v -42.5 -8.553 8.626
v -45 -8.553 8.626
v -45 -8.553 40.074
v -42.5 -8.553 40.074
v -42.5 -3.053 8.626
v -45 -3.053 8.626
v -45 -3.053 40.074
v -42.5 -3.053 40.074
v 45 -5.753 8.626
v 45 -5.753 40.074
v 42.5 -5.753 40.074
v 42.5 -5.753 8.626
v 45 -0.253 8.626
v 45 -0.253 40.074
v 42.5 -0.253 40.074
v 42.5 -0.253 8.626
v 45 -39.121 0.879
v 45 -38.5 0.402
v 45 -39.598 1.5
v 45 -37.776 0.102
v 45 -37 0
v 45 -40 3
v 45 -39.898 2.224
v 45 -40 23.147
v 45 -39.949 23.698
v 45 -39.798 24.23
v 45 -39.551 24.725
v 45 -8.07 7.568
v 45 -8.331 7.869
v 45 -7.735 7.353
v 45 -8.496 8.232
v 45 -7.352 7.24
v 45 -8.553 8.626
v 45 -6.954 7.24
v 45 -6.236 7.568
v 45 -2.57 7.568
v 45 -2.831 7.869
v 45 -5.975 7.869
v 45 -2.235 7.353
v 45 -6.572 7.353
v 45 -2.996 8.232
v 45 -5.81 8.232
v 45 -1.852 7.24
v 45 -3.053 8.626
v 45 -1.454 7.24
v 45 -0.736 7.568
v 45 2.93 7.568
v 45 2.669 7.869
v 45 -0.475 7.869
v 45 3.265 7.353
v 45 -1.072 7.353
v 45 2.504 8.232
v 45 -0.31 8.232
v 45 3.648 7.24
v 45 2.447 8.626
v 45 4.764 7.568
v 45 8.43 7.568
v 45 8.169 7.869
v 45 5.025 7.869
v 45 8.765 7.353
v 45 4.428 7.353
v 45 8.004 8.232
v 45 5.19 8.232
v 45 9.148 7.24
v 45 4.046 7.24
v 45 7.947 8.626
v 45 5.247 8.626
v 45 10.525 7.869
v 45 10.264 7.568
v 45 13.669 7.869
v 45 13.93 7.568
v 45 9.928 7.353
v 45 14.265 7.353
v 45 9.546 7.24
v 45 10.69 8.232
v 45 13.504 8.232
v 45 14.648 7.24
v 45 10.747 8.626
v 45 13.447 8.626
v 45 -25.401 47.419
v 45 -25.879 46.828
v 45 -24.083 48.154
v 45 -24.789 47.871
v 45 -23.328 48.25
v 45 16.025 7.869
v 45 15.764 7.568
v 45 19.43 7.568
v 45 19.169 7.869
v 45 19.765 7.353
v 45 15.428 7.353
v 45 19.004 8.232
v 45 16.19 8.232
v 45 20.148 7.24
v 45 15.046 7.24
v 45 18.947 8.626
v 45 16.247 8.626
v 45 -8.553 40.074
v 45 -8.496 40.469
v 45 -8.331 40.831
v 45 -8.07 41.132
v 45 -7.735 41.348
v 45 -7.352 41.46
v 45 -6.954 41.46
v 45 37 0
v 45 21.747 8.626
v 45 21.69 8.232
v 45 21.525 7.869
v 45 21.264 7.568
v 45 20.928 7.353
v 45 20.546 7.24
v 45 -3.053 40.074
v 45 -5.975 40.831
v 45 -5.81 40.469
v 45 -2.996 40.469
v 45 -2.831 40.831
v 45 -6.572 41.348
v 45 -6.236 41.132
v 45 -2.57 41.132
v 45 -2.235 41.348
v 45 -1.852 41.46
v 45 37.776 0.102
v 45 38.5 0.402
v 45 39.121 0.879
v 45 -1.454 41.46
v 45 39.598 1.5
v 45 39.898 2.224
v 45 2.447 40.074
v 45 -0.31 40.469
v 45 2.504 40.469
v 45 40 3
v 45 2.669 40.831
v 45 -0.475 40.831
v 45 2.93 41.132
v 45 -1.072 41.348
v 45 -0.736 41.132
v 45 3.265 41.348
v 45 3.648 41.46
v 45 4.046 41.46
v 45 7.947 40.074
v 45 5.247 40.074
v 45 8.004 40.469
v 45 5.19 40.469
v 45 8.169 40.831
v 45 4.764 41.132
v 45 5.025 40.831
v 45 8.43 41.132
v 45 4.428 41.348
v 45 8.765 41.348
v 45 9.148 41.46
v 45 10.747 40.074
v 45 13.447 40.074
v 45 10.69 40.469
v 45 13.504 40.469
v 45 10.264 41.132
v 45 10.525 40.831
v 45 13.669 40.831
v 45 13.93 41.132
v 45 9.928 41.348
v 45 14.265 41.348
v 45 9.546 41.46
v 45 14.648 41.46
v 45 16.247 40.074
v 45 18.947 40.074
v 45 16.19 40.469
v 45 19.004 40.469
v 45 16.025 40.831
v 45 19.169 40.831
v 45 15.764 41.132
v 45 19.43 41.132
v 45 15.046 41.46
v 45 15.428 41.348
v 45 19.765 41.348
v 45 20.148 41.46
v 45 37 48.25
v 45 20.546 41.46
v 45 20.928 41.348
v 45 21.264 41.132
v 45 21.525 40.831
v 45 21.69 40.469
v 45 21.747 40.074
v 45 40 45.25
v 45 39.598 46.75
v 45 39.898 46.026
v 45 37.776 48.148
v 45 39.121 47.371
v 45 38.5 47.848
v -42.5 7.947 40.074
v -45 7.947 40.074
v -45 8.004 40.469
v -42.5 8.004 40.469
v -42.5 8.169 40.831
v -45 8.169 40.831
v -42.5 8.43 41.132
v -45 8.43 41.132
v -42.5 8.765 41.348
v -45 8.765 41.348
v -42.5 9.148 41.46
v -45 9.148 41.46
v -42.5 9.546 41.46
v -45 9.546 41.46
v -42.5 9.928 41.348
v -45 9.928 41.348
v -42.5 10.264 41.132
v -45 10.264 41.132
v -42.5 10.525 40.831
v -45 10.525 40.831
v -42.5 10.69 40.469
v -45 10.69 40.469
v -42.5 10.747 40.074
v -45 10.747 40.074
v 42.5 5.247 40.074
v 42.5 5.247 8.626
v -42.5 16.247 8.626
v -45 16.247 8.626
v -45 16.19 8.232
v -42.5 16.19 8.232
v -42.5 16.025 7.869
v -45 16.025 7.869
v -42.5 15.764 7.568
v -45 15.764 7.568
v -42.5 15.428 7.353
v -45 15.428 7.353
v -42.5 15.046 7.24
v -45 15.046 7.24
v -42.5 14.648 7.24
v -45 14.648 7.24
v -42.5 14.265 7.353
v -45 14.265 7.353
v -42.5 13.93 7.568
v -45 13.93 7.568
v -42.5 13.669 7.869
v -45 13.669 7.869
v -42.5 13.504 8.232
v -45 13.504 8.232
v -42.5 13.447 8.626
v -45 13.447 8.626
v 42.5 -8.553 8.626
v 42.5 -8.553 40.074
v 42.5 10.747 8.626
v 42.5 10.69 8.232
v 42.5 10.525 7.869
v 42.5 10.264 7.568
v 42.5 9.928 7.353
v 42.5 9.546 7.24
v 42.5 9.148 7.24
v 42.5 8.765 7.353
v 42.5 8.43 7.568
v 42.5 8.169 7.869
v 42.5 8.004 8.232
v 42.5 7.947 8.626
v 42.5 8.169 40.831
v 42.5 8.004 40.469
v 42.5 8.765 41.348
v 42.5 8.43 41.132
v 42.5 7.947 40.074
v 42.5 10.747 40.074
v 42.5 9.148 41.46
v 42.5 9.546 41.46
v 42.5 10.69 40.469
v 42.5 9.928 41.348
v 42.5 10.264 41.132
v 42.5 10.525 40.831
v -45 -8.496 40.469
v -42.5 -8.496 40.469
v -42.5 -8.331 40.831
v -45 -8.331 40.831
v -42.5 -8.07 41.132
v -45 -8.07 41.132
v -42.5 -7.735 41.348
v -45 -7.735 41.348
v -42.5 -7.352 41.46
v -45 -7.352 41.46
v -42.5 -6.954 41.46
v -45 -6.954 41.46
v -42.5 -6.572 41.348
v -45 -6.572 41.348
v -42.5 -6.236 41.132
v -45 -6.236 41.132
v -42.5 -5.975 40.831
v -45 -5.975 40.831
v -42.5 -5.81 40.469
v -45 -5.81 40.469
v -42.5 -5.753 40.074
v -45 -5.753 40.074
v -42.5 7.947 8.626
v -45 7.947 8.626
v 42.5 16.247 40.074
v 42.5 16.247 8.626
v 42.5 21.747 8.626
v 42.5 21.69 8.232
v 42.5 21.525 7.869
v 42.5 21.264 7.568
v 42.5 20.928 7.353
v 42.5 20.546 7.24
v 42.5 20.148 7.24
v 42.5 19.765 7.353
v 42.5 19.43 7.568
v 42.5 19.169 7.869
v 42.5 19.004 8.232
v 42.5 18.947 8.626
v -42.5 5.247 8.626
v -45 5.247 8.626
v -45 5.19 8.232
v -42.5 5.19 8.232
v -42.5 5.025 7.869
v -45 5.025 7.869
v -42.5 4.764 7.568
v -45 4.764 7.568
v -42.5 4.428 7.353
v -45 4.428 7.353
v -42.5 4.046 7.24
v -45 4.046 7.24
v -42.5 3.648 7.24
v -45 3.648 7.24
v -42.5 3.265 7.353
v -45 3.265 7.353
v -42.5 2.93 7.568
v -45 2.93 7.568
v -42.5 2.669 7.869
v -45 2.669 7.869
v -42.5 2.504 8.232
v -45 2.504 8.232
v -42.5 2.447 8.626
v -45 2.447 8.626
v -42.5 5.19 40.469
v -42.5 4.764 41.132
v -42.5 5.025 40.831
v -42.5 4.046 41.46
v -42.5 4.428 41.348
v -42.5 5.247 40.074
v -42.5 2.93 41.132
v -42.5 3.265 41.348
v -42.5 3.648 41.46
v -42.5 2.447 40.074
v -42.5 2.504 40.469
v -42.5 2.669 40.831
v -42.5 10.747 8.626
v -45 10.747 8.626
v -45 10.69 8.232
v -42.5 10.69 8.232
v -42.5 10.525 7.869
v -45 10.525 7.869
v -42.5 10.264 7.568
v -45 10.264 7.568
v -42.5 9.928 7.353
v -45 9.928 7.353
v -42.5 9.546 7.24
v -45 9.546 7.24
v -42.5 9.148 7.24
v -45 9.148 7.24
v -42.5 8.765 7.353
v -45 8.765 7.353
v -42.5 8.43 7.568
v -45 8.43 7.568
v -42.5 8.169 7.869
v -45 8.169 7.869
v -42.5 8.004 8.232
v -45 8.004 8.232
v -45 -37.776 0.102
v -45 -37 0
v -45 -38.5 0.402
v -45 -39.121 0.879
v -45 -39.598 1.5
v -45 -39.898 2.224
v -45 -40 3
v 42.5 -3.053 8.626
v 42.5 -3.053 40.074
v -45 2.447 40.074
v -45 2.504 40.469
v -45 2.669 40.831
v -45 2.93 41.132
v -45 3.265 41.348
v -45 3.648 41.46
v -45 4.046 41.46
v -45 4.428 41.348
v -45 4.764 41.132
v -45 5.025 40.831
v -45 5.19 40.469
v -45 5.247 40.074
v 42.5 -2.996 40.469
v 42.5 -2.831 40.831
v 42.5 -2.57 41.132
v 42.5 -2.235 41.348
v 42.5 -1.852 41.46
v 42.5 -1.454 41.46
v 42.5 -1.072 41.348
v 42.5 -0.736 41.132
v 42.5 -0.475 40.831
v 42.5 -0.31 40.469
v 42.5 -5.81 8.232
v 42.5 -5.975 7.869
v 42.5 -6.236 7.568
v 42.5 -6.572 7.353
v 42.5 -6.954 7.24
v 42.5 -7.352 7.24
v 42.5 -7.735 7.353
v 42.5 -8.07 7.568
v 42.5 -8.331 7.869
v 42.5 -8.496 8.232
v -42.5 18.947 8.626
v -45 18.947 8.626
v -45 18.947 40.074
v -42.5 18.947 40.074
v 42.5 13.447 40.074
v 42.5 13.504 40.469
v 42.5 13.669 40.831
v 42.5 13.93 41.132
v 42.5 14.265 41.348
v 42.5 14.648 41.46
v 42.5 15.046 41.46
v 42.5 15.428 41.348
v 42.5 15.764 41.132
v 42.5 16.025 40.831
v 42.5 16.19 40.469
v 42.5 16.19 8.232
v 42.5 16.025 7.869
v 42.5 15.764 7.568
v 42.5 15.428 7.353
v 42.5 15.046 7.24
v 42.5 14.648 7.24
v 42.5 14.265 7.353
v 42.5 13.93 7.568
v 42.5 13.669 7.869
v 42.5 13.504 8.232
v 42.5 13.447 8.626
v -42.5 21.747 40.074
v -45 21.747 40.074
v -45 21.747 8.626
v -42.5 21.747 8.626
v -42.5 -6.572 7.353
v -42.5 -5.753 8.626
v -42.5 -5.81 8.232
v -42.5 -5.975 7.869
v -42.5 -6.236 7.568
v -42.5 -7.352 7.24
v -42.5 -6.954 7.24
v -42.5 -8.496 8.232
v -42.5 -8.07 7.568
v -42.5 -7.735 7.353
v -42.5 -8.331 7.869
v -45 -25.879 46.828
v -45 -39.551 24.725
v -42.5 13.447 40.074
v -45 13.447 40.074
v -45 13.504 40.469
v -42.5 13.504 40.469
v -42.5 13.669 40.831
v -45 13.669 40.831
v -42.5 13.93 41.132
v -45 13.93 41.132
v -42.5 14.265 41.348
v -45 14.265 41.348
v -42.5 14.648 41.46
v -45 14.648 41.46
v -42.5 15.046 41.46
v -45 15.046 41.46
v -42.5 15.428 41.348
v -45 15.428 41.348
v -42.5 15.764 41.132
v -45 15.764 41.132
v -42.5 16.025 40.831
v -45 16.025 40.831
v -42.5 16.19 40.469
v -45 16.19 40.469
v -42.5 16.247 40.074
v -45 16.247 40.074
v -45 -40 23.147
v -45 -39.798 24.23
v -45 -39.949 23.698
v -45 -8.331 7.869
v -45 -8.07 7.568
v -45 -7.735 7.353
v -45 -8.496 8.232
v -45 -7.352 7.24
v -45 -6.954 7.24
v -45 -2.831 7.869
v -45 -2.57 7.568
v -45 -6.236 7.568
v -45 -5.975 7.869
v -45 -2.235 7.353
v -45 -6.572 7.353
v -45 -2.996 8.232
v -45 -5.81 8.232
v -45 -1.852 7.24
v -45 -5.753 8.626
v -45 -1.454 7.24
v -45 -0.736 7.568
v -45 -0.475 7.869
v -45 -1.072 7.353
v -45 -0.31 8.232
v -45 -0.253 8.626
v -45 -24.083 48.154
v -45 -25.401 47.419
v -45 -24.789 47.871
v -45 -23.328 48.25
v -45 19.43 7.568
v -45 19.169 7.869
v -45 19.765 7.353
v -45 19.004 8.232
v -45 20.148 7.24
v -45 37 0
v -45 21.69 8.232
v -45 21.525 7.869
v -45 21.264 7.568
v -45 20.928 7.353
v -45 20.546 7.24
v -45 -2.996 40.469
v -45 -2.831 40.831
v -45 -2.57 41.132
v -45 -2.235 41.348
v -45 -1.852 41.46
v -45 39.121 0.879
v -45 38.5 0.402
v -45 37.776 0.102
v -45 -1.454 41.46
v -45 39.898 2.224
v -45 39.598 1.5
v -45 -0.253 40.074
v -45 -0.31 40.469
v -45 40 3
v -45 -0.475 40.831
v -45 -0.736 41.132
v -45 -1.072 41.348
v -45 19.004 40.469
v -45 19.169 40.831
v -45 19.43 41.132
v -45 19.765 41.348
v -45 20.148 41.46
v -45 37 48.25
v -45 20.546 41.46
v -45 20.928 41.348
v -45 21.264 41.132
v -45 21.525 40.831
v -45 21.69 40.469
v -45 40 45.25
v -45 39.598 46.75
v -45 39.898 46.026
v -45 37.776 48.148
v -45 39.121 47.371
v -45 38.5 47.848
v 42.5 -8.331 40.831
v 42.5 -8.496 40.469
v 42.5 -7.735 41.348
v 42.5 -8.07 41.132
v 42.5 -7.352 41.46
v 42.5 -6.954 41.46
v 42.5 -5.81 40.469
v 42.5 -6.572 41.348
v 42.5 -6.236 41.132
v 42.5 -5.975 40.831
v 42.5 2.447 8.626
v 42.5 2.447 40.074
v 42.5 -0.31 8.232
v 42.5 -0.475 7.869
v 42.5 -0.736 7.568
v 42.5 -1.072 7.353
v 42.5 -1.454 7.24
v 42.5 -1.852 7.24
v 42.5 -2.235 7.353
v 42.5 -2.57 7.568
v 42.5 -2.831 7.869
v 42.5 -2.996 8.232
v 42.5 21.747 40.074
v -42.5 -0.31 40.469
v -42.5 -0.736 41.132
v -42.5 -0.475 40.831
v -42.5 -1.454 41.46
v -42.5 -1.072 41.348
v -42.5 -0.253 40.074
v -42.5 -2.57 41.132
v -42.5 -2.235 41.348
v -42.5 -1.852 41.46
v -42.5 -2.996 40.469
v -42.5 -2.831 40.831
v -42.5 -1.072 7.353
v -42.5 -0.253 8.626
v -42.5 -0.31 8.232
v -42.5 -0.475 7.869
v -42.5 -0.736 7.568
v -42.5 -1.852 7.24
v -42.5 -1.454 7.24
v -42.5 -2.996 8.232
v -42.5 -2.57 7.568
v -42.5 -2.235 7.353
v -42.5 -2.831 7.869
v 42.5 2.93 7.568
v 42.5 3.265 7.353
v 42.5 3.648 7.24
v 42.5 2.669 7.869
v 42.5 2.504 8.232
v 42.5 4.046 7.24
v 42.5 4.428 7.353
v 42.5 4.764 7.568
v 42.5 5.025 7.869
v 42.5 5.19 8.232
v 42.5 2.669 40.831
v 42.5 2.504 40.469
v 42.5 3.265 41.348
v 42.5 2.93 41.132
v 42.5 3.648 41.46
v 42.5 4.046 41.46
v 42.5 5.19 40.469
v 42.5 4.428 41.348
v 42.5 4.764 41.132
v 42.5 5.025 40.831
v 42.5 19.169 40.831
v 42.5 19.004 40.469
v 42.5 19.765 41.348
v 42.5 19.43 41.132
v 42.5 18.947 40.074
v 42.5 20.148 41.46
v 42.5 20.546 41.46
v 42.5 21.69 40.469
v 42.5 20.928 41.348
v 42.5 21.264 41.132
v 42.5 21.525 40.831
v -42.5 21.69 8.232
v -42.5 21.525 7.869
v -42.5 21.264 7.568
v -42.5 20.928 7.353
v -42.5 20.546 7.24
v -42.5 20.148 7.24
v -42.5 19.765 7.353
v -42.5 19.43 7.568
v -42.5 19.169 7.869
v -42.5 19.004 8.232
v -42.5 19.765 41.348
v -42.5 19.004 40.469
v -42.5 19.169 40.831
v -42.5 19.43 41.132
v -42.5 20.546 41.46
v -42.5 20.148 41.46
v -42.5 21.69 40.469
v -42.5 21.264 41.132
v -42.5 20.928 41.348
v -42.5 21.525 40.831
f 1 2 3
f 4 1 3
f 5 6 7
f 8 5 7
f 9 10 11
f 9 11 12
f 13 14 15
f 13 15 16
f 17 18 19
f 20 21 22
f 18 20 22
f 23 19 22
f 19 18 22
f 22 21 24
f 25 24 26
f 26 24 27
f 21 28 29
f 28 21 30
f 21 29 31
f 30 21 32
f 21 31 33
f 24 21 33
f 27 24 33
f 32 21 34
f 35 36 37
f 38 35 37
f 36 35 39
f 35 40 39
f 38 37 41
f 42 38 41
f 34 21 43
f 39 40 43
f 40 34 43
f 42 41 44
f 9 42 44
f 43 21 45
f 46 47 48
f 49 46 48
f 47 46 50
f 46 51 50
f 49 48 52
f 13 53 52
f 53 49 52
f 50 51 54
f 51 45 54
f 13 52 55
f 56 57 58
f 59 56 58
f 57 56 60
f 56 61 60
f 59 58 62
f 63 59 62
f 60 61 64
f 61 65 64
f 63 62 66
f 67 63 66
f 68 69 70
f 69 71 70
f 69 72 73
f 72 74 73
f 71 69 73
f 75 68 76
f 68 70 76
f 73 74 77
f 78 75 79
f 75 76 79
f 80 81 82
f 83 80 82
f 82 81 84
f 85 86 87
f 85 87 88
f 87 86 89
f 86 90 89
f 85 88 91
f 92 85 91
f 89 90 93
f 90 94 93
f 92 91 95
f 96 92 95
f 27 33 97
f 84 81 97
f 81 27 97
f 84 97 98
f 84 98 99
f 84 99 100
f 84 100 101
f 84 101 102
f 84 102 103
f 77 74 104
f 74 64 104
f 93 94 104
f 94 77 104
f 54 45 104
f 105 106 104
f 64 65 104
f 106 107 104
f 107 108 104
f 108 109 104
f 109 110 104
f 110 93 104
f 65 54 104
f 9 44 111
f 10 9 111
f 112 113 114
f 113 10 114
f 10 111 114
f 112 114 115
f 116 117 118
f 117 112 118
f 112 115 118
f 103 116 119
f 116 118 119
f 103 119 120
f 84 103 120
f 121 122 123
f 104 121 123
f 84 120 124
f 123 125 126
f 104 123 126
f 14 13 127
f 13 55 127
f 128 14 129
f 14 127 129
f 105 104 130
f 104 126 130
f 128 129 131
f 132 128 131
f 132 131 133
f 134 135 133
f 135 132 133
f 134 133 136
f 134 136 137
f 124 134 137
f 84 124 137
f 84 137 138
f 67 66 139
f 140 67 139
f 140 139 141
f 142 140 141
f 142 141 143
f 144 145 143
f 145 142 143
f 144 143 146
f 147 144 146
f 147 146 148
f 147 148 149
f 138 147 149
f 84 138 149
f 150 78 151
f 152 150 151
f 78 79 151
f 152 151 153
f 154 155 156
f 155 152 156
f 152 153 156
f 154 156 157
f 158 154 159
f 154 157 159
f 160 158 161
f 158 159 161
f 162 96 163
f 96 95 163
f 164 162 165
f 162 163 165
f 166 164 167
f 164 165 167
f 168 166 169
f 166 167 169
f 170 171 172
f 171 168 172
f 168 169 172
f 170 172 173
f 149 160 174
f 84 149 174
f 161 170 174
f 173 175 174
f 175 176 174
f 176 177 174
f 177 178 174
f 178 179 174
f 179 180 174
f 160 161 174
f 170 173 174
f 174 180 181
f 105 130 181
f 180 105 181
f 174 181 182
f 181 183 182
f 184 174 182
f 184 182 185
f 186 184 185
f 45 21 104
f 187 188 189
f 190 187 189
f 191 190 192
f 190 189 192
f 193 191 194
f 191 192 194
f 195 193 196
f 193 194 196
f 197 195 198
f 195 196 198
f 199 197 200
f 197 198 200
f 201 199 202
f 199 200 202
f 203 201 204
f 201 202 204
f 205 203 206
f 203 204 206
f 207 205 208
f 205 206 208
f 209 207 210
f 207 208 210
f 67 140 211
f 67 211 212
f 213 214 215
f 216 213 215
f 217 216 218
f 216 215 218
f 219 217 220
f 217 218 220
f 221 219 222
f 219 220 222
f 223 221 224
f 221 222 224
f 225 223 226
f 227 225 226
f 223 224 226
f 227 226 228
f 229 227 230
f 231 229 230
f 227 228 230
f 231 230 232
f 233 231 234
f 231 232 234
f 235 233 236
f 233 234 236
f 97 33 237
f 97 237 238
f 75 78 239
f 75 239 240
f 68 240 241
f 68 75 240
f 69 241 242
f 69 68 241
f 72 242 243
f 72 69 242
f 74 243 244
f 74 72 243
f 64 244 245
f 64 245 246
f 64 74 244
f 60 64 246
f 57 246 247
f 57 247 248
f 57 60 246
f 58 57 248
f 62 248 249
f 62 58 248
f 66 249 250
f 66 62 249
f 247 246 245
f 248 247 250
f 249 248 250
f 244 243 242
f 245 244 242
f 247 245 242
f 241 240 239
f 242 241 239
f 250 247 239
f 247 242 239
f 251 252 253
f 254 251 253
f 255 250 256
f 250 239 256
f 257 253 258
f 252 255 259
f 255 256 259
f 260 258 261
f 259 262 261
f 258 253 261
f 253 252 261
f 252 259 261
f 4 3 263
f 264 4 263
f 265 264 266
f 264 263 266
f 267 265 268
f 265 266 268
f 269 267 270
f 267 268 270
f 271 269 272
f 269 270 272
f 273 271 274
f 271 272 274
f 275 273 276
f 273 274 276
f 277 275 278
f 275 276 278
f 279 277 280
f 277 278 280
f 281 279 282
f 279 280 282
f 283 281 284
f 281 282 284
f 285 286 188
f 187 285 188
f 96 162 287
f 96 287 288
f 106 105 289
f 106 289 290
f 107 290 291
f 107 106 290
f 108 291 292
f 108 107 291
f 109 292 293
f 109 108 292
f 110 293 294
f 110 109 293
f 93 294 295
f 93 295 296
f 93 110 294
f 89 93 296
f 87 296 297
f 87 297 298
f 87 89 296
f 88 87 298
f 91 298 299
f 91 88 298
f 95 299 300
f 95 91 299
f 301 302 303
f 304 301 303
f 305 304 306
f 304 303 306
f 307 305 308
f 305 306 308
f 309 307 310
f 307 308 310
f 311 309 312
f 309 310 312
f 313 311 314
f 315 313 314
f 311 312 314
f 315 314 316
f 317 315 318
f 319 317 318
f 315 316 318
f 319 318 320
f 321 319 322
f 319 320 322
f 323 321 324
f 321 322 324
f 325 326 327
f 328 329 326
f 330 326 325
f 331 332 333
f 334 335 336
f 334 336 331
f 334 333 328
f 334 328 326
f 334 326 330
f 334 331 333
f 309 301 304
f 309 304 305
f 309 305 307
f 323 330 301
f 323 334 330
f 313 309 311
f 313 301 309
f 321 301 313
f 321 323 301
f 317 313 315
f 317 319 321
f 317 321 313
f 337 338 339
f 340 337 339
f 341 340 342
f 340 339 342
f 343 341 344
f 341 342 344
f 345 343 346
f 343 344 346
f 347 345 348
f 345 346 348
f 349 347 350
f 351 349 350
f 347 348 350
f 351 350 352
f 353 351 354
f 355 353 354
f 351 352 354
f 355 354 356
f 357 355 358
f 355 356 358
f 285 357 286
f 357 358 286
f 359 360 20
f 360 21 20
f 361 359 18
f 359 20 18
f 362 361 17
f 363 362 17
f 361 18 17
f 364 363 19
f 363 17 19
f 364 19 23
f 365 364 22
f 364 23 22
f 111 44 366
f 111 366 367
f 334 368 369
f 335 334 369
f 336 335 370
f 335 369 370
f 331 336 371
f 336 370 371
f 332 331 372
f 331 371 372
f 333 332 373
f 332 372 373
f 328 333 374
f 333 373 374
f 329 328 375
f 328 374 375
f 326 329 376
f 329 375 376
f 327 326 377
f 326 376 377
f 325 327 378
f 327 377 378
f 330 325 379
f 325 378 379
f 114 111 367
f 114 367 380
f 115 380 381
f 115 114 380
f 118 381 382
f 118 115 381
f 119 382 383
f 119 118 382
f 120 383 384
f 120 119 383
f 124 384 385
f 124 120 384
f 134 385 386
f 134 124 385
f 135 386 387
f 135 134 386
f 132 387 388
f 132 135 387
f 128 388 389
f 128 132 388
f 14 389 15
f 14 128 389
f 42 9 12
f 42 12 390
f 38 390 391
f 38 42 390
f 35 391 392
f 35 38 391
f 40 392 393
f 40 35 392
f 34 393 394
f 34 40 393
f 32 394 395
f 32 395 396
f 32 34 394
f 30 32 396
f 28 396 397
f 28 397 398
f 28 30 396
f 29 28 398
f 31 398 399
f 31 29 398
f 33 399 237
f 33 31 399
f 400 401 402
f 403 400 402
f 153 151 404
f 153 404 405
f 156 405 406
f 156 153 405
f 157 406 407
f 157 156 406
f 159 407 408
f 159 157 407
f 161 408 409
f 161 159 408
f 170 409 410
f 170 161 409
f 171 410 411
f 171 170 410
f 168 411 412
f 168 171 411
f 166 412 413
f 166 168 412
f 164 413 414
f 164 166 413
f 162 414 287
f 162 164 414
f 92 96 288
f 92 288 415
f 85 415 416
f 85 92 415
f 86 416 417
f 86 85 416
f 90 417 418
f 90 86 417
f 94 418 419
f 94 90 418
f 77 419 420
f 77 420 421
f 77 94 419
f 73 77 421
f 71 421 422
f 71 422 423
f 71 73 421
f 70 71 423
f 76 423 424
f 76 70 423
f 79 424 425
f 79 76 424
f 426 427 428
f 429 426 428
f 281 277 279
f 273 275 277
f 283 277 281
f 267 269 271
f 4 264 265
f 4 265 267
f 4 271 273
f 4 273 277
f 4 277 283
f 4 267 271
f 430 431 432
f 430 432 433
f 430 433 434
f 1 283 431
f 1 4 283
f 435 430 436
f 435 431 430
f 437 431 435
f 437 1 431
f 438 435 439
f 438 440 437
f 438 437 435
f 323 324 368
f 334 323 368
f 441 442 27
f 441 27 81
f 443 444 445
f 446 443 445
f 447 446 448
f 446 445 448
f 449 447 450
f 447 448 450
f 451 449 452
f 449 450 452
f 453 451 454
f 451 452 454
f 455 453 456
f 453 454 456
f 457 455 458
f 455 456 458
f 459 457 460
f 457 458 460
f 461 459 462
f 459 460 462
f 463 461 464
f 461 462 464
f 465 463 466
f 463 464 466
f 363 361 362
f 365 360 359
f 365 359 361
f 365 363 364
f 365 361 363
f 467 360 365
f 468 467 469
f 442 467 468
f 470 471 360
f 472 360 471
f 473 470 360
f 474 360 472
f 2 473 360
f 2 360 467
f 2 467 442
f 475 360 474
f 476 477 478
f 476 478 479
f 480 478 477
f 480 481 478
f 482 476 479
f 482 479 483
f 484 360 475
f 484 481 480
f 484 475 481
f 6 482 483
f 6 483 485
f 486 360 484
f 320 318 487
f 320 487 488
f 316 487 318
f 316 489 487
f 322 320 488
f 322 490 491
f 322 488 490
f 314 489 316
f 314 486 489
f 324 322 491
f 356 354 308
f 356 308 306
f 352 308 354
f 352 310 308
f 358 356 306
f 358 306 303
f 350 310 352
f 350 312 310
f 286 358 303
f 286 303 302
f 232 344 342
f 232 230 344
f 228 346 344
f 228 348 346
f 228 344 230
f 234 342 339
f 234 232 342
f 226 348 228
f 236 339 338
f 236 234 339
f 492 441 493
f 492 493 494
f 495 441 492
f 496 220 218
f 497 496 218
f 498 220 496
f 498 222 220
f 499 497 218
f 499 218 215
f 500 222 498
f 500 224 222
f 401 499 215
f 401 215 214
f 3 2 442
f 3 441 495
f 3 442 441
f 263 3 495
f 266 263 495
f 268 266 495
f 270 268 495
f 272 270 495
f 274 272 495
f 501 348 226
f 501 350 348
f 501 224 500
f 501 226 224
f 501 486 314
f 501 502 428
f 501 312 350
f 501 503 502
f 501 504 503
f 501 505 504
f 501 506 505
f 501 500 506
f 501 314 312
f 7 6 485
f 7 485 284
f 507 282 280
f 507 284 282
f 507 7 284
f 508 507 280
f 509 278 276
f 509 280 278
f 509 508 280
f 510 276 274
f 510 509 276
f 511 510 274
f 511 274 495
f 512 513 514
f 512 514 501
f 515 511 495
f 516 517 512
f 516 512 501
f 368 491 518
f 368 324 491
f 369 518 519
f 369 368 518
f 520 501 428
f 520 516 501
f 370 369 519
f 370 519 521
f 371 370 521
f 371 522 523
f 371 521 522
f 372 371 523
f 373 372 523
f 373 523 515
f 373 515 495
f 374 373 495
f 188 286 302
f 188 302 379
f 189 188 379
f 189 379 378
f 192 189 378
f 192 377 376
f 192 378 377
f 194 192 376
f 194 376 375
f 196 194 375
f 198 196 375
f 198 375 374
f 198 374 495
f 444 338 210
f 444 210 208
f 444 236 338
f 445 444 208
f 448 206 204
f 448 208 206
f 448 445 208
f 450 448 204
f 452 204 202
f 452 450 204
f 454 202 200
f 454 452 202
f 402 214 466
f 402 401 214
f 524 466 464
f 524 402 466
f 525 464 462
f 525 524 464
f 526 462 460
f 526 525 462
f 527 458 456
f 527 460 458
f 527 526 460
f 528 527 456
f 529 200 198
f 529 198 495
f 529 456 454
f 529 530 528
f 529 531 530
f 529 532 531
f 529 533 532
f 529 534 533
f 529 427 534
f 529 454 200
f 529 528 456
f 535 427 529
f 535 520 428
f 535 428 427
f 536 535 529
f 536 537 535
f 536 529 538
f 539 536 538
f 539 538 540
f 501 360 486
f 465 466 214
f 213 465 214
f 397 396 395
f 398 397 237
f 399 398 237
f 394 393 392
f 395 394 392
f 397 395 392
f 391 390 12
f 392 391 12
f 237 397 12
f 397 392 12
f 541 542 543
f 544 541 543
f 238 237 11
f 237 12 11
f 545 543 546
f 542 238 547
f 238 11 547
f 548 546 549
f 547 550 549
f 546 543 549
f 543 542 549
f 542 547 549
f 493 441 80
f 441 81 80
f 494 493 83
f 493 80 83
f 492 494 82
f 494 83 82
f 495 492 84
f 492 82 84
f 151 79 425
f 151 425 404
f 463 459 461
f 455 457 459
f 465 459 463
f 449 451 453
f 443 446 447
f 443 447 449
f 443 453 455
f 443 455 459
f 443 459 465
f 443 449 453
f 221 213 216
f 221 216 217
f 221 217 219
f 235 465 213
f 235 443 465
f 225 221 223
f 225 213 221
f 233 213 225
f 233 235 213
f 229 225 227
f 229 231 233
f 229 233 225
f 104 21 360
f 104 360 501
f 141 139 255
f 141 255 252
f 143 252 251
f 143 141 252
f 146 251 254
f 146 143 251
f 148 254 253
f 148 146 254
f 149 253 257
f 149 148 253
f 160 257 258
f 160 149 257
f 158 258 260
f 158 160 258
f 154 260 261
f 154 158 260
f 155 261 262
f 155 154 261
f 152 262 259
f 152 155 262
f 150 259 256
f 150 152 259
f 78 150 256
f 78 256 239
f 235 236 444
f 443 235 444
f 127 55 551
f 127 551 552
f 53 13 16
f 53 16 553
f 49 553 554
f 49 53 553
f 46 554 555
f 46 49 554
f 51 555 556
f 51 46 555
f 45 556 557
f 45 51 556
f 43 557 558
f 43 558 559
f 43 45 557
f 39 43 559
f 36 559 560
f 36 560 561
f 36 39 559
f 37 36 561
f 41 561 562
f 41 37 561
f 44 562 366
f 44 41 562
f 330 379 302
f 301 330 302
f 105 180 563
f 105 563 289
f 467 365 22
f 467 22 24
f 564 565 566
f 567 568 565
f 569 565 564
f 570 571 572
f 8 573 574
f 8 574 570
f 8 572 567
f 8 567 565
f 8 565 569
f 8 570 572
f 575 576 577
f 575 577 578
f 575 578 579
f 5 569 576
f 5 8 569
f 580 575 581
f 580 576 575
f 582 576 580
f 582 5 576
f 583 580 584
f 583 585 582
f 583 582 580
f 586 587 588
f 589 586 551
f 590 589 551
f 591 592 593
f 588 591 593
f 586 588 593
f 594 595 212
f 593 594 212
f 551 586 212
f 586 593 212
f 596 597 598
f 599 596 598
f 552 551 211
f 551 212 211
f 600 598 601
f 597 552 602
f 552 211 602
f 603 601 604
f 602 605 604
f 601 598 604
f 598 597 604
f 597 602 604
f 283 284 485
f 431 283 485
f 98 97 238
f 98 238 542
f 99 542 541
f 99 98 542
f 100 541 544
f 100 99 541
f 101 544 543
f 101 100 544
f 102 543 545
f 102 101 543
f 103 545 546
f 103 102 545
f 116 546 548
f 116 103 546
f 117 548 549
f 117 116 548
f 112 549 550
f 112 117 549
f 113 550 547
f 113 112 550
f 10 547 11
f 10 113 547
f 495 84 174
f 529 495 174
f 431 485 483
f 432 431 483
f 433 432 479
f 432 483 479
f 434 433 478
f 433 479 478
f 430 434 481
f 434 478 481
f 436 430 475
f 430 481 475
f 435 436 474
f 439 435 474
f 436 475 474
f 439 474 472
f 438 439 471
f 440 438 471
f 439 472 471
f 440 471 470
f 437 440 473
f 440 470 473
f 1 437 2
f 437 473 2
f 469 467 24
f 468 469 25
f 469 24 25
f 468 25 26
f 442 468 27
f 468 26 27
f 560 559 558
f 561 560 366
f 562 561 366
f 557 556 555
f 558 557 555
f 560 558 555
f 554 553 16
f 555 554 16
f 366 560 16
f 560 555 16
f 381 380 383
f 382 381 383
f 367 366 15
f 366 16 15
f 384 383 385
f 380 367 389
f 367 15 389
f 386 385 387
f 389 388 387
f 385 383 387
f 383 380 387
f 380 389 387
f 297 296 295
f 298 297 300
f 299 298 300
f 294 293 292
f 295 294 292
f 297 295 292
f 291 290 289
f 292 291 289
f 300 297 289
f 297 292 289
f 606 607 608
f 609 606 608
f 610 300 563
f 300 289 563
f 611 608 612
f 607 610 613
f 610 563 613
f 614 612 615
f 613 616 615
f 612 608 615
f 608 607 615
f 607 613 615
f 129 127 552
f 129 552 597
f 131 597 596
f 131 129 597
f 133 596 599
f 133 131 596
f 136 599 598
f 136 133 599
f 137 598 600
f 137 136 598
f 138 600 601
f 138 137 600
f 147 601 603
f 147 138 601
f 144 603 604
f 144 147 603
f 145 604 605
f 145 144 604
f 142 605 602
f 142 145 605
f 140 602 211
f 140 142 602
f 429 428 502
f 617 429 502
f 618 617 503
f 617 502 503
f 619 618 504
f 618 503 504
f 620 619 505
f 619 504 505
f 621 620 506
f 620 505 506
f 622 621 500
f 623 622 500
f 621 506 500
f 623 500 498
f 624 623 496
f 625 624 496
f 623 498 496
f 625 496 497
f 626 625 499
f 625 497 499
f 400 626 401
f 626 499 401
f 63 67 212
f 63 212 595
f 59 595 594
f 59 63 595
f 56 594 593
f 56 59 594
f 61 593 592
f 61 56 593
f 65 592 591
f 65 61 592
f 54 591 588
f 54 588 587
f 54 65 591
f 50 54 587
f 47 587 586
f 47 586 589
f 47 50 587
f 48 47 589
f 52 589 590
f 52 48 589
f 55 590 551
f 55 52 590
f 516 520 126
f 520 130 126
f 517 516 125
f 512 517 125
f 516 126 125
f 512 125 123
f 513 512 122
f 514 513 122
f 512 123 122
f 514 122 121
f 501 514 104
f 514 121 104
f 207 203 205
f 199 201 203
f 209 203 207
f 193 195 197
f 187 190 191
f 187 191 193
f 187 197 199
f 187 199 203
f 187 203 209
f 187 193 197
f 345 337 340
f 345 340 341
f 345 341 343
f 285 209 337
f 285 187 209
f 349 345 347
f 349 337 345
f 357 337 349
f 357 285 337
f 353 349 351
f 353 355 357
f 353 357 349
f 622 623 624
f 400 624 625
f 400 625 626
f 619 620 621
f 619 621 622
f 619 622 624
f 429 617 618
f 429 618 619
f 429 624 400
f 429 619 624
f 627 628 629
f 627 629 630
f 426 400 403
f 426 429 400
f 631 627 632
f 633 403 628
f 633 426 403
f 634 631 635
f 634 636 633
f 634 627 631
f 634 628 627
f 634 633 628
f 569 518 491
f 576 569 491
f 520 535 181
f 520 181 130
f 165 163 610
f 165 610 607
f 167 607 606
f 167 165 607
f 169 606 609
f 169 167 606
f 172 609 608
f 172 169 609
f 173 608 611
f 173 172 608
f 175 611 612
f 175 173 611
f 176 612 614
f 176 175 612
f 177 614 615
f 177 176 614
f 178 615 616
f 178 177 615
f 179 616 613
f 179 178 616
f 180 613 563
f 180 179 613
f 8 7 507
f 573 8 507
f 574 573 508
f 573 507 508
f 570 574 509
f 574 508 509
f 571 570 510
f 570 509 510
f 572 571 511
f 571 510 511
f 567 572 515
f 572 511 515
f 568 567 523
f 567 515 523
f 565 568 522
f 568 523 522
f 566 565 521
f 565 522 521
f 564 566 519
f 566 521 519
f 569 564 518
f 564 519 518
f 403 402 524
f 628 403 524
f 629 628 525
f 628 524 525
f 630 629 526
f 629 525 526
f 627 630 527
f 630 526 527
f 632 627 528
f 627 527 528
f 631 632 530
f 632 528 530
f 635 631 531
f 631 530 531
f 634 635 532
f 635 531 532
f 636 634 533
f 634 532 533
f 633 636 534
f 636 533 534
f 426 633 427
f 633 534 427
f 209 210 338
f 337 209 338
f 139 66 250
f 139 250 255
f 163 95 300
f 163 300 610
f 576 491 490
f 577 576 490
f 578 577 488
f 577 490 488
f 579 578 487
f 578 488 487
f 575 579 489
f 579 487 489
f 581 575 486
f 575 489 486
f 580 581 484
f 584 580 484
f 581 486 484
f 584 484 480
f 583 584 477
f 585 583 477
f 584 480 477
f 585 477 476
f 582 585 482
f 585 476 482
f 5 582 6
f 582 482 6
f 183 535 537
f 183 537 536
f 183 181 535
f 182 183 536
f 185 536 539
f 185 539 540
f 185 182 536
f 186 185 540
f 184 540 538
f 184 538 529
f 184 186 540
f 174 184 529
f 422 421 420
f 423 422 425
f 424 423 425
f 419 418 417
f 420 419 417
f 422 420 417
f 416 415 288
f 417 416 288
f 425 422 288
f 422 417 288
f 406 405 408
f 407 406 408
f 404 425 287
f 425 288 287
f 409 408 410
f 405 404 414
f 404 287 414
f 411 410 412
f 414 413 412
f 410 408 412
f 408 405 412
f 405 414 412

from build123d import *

# Parameters (mm, degrees)
BOSS_EXTRU_1_DEPTH         = 45
BOSS_EXTRU_1_DEPTH_BACK    = 45
CONG_1_R                   = 3
ENL_V_MAT_EXTRU_1_DEPTH    = 2.5
R_P_TITION_LIN_AIRE1_COUNT = 6
R_P_TITION_LIN_AIRE1_PITCH = 5.5
SYM_TRIE1_COPY_1_DEPTH     = 2.5
SYM_TRIE1_COPY_2_DEPTH     = 2.5
SYM_TRIE1_COPY_3_DEPTH     = 2.5
SYM_TRIE1_COPY_4_DEPTH     = 2.5
SYM_TRIE1_COPY_5_DEPTH     = 2.5
SYM_TRIE1_COPY_6_DEPTH     = 2.5


with BuildPart() as part:
    # Esquisse1 → Boss.-Extru.1 (new, two sides: drawn at the far end of the back side and taken through both)
    with BuildSketch(Plane(origin=(0, 0, 0), x_dir=(0, 0, -1), z_dir=(1, 0, 0)).offset(-BOSS_EXTRU_1_DEPTH_BACK)):
        Polygon((-48.25, 40), (0, 40), (0, 0), (0, -40), (-24, -40), (-48.25, -25), align=None)
    extrude(amount=BOSS_EXTRU_1_DEPTH + BOSS_EXTRU_1_DEPTH_BACK)

    # Congé1
    cong_1_edges = [part.edges().sort_by_distance(p)[0] for p in [
        (0, -40, 24),
        (0, -25, 48.25),
        (0, -40, 0),
        (0, 40, 0),
        (0, 40, 48.25),
    ]]
    fillet(cong_1_edges, radius=CONG_1_R)

    # Esquisse2 → Enlèv. mat.-Extru.1 (cut)
    with BuildSketch(Plane(origin=(45, 0, 0), x_dir=(0, 0, -1), z_dir=(1, 0, 0))):
        with BuildLine():
            Line((-40.074077662, 21.746799664), (-8.626027221, 21.746799664))
            ThreePointArc((-8.626027221, 21.746799664), (-7.226027221, 20.346799664), (-8.626027221, 18.946799664))
            Line((-8.626027221, 18.946799664), (-40.074077662, 18.946799664))
            ThreePointArc((-40.074077662, 18.946799664), (-41.474077662, 20.346799664), (-40.074077662, 21.746799664))
        make_face()
    enl_v_mat_extru_1 = extrude(amount=-ENL_V_MAT_EXTRU_1_DEPTH, mode=Mode.SUBTRACT)

    # Répétition linéaire1: Enlèv. mat.-Extru.1 ×6
    with Locations(*[(0, -i * R_P_TITION_LIN_AIRE1_PITCH, 0) for i in range(1, R_P_TITION_LIN_AIRE1_COUNT)]):
        add(enl_v_mat_extru_1, mode=Mode.SUBTRACT)

    # Symétrie1 copy 1 sketch → Symétrie1 copy 1 (cut)
    with BuildSketch(Plane(origin=(-45, -5.5, 0), x_dir=(0, 0, -1), z_dir=(-1, 0, 0))):
        with BuildLine():
            Line((-40.074077662, -21.746799664), (-8.626027221, -21.746799664))
            ThreePointArc((-8.626027221, -21.746799664), (-7.226027221, -20.346799664), (-8.626027221, -18.946799664))
            Line((-8.626027221, -18.946799664), (-40.074077662, -18.946799664))
            ThreePointArc((-40.074077662, -18.946799664), (-41.474077662, -20.346799664), (-40.074077662, -21.746799664))
        make_face()
    extrude(amount=-SYM_TRIE1_COPY_1_DEPTH, mode=Mode.SUBTRACT)

    # Symétrie1 copy 2 sketch → Symétrie1 copy 2 (cut)
    with BuildSketch(Plane(origin=(-45, -11, 0), x_dir=(0, 0, -1), z_dir=(-1, 0, 0))):
        with BuildLine():
            Line((-40.074077662, -21.746799664), (-8.626027221, -21.746799664))
            ThreePointArc((-8.626027221, -21.746799664), (-7.226027221, -20.346799664), (-8.626027221, -18.946799664))
            Line((-8.626027221, -18.946799664), (-40.074077662, -18.946799664))
            ThreePointArc((-40.074077662, -18.946799664), (-41.474077662, -20.346799664), (-40.074077662, -21.746799664))
        make_face()
    extrude(amount=-SYM_TRIE1_COPY_2_DEPTH, mode=Mode.SUBTRACT)

    # Symétrie1 copy 3 sketch → Symétrie1 copy 3 (cut)
    with BuildSketch(Plane(origin=(-45, -16.5, 0), x_dir=(0, 0, -1), z_dir=(-1, 0, 0))):
        with BuildLine():
            Line((-40.074077662, -21.746799664), (-8.626027221, -21.746799664))
            ThreePointArc((-8.626027221, -21.746799664), (-7.226027221, -20.346799664), (-8.626027221, -18.946799664))
            Line((-8.626027221, -18.946799664), (-40.074077662, -18.946799664))
            ThreePointArc((-40.074077662, -18.946799664), (-41.474077662, -20.346799664), (-40.074077662, -21.746799664))
        make_face()
    extrude(amount=-SYM_TRIE1_COPY_3_DEPTH, mode=Mode.SUBTRACT)

    # Symétrie1 copy 4 sketch → Symétrie1 copy 4 (cut)
    with BuildSketch(Plane(origin=(-45, -22, 0), x_dir=(0, 0, -1), z_dir=(-1, 0, 0))):
        with BuildLine():
            Line((-40.074077662, -21.746799664), (-8.626027221, -21.746799664))
            ThreePointArc((-8.626027221, -21.746799664), (-7.226027221, -20.346799664), (-8.626027221, -18.946799664))
            Line((-8.626027221, -18.946799664), (-40.074077662, -18.946799664))
            ThreePointArc((-40.074077662, -18.946799664), (-41.474077662, -20.346799664), (-40.074077662, -21.746799664))
        make_face()
    extrude(amount=-SYM_TRIE1_COPY_4_DEPTH, mode=Mode.SUBTRACT)

    # Symétrie1 copy 5 sketch → Symétrie1 copy 5 (cut)
    with BuildSketch(Plane(origin=(-45, -27.5, 0), x_dir=(0, 0, -1), z_dir=(-1, 0, 0))):
        with BuildLine():
            Line((-40.074077662, -21.746799664), (-8.626027221, -21.746799664))
            ThreePointArc((-8.626027221, -21.746799664), (-7.226027221, -20.346799664), (-8.626027221, -18.946799664))
            Line((-8.626027221, -18.946799664), (-40.074077662, -18.946799664))
            ThreePointArc((-40.074077662, -18.946799664), (-41.474077662, -20.346799664), (-40.074077662, -21.746799664))
        make_face()
    extrude(amount=-SYM_TRIE1_COPY_5_DEPTH, mode=Mode.SUBTRACT)

    # Symétrie1 copy 6 sketch → Symétrie1 copy 6 (cut)
    with BuildSketch(Plane(origin=(-45, 0, 0), x_dir=(0, 0, -1), z_dir=(-1, 0, 0))):
        with BuildLine():
            Line((-40.074077662, -21.746799664), (-8.626027221, -21.746799664))
            ThreePointArc((-8.626027221, -21.746799664), (-7.226027221, -20.346799664), (-8.626027221, -18.946799664))
            Line((-8.626027221, -18.946799664), (-40.074077662, -18.946799664))
            ThreePointArc((-40.074077662, -18.946799664), (-41.474077662, -20.346799664), (-40.074077662, -21.746799664))
        make_face()
    extrude(amount=-SYM_TRIE1_COPY_6_DEPTH, mode=Mode.SUBTRACT)


solid = part.part
